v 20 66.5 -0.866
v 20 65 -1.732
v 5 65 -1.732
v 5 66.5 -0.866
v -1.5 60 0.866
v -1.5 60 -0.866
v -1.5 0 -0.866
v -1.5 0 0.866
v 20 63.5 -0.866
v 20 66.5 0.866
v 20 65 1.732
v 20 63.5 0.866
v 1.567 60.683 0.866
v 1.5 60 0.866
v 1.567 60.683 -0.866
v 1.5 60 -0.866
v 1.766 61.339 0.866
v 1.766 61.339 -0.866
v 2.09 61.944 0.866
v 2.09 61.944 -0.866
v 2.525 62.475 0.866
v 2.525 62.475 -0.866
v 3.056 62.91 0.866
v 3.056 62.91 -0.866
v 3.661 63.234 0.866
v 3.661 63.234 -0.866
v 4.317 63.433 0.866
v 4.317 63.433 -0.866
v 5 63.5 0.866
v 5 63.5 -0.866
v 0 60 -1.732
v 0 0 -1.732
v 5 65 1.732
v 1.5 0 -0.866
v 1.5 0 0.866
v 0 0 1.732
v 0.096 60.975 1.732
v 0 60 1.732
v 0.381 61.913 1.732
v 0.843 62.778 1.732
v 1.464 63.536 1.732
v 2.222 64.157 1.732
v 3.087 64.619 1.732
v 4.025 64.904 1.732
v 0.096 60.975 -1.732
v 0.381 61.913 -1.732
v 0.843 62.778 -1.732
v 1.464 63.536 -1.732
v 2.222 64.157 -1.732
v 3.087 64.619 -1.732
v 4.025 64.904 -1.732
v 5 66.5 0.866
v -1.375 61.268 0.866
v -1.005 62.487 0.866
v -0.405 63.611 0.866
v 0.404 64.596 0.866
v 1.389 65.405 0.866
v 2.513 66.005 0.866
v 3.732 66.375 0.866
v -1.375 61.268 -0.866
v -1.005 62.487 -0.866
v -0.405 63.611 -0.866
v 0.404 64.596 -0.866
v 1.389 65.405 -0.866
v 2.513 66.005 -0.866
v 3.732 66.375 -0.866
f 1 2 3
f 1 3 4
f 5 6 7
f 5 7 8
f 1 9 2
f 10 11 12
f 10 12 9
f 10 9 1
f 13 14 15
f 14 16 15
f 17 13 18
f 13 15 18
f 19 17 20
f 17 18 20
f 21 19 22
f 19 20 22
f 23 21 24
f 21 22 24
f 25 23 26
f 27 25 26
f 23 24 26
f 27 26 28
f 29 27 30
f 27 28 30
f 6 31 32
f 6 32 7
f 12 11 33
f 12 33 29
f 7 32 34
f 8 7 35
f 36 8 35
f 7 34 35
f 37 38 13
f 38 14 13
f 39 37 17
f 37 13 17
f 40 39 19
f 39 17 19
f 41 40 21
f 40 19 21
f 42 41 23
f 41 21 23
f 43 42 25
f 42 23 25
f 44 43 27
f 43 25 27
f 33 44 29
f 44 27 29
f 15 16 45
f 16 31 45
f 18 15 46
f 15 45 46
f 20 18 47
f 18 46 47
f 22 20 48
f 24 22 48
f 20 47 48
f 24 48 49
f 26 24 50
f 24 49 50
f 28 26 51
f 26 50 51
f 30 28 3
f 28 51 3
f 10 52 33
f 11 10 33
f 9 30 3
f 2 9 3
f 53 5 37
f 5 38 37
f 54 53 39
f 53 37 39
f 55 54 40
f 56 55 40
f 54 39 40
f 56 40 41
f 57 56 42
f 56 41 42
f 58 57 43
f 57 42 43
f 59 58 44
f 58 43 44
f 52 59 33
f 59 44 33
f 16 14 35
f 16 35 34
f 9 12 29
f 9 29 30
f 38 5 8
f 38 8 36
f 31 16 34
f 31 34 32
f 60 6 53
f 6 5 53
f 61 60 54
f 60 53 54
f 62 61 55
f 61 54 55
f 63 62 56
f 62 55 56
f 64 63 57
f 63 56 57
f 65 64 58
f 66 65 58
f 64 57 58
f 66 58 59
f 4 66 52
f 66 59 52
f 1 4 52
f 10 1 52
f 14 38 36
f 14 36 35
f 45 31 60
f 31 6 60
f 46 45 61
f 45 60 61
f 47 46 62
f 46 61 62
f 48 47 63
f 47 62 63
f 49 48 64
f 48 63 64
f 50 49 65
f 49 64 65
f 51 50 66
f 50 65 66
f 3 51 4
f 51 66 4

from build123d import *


with BuildPart() as part:
    # Táhnout po křivce1: sweep along a path in Skica1
    with BuildLine(Plane.XY) as t_hnout_po_k_ivce1_path:
        Line((0, 0), (0, 60))
        ThreePointArc((0, 60), (1.464466094, 63.535533906), (5, 65))
        Line((5, 65), (20, 65))
    # Skica2 → Táhnout po křivce1 (sweep)
    with BuildSketch(Plane(origin=(0, 0, 0), x_dir=(1, 0, 0), z_dir=(0, 1, 0))):
        Polygon((1.5, 0.866025404), (0, 1.732050808), (-1.5, 0.866025404), (-1.5, -0.866025404), (0, -1.732050808), (1.5, -0.866025404), align=None)
    sweep(path=t_hnout_po_k_ivce1_path.line)


solid = part.part
